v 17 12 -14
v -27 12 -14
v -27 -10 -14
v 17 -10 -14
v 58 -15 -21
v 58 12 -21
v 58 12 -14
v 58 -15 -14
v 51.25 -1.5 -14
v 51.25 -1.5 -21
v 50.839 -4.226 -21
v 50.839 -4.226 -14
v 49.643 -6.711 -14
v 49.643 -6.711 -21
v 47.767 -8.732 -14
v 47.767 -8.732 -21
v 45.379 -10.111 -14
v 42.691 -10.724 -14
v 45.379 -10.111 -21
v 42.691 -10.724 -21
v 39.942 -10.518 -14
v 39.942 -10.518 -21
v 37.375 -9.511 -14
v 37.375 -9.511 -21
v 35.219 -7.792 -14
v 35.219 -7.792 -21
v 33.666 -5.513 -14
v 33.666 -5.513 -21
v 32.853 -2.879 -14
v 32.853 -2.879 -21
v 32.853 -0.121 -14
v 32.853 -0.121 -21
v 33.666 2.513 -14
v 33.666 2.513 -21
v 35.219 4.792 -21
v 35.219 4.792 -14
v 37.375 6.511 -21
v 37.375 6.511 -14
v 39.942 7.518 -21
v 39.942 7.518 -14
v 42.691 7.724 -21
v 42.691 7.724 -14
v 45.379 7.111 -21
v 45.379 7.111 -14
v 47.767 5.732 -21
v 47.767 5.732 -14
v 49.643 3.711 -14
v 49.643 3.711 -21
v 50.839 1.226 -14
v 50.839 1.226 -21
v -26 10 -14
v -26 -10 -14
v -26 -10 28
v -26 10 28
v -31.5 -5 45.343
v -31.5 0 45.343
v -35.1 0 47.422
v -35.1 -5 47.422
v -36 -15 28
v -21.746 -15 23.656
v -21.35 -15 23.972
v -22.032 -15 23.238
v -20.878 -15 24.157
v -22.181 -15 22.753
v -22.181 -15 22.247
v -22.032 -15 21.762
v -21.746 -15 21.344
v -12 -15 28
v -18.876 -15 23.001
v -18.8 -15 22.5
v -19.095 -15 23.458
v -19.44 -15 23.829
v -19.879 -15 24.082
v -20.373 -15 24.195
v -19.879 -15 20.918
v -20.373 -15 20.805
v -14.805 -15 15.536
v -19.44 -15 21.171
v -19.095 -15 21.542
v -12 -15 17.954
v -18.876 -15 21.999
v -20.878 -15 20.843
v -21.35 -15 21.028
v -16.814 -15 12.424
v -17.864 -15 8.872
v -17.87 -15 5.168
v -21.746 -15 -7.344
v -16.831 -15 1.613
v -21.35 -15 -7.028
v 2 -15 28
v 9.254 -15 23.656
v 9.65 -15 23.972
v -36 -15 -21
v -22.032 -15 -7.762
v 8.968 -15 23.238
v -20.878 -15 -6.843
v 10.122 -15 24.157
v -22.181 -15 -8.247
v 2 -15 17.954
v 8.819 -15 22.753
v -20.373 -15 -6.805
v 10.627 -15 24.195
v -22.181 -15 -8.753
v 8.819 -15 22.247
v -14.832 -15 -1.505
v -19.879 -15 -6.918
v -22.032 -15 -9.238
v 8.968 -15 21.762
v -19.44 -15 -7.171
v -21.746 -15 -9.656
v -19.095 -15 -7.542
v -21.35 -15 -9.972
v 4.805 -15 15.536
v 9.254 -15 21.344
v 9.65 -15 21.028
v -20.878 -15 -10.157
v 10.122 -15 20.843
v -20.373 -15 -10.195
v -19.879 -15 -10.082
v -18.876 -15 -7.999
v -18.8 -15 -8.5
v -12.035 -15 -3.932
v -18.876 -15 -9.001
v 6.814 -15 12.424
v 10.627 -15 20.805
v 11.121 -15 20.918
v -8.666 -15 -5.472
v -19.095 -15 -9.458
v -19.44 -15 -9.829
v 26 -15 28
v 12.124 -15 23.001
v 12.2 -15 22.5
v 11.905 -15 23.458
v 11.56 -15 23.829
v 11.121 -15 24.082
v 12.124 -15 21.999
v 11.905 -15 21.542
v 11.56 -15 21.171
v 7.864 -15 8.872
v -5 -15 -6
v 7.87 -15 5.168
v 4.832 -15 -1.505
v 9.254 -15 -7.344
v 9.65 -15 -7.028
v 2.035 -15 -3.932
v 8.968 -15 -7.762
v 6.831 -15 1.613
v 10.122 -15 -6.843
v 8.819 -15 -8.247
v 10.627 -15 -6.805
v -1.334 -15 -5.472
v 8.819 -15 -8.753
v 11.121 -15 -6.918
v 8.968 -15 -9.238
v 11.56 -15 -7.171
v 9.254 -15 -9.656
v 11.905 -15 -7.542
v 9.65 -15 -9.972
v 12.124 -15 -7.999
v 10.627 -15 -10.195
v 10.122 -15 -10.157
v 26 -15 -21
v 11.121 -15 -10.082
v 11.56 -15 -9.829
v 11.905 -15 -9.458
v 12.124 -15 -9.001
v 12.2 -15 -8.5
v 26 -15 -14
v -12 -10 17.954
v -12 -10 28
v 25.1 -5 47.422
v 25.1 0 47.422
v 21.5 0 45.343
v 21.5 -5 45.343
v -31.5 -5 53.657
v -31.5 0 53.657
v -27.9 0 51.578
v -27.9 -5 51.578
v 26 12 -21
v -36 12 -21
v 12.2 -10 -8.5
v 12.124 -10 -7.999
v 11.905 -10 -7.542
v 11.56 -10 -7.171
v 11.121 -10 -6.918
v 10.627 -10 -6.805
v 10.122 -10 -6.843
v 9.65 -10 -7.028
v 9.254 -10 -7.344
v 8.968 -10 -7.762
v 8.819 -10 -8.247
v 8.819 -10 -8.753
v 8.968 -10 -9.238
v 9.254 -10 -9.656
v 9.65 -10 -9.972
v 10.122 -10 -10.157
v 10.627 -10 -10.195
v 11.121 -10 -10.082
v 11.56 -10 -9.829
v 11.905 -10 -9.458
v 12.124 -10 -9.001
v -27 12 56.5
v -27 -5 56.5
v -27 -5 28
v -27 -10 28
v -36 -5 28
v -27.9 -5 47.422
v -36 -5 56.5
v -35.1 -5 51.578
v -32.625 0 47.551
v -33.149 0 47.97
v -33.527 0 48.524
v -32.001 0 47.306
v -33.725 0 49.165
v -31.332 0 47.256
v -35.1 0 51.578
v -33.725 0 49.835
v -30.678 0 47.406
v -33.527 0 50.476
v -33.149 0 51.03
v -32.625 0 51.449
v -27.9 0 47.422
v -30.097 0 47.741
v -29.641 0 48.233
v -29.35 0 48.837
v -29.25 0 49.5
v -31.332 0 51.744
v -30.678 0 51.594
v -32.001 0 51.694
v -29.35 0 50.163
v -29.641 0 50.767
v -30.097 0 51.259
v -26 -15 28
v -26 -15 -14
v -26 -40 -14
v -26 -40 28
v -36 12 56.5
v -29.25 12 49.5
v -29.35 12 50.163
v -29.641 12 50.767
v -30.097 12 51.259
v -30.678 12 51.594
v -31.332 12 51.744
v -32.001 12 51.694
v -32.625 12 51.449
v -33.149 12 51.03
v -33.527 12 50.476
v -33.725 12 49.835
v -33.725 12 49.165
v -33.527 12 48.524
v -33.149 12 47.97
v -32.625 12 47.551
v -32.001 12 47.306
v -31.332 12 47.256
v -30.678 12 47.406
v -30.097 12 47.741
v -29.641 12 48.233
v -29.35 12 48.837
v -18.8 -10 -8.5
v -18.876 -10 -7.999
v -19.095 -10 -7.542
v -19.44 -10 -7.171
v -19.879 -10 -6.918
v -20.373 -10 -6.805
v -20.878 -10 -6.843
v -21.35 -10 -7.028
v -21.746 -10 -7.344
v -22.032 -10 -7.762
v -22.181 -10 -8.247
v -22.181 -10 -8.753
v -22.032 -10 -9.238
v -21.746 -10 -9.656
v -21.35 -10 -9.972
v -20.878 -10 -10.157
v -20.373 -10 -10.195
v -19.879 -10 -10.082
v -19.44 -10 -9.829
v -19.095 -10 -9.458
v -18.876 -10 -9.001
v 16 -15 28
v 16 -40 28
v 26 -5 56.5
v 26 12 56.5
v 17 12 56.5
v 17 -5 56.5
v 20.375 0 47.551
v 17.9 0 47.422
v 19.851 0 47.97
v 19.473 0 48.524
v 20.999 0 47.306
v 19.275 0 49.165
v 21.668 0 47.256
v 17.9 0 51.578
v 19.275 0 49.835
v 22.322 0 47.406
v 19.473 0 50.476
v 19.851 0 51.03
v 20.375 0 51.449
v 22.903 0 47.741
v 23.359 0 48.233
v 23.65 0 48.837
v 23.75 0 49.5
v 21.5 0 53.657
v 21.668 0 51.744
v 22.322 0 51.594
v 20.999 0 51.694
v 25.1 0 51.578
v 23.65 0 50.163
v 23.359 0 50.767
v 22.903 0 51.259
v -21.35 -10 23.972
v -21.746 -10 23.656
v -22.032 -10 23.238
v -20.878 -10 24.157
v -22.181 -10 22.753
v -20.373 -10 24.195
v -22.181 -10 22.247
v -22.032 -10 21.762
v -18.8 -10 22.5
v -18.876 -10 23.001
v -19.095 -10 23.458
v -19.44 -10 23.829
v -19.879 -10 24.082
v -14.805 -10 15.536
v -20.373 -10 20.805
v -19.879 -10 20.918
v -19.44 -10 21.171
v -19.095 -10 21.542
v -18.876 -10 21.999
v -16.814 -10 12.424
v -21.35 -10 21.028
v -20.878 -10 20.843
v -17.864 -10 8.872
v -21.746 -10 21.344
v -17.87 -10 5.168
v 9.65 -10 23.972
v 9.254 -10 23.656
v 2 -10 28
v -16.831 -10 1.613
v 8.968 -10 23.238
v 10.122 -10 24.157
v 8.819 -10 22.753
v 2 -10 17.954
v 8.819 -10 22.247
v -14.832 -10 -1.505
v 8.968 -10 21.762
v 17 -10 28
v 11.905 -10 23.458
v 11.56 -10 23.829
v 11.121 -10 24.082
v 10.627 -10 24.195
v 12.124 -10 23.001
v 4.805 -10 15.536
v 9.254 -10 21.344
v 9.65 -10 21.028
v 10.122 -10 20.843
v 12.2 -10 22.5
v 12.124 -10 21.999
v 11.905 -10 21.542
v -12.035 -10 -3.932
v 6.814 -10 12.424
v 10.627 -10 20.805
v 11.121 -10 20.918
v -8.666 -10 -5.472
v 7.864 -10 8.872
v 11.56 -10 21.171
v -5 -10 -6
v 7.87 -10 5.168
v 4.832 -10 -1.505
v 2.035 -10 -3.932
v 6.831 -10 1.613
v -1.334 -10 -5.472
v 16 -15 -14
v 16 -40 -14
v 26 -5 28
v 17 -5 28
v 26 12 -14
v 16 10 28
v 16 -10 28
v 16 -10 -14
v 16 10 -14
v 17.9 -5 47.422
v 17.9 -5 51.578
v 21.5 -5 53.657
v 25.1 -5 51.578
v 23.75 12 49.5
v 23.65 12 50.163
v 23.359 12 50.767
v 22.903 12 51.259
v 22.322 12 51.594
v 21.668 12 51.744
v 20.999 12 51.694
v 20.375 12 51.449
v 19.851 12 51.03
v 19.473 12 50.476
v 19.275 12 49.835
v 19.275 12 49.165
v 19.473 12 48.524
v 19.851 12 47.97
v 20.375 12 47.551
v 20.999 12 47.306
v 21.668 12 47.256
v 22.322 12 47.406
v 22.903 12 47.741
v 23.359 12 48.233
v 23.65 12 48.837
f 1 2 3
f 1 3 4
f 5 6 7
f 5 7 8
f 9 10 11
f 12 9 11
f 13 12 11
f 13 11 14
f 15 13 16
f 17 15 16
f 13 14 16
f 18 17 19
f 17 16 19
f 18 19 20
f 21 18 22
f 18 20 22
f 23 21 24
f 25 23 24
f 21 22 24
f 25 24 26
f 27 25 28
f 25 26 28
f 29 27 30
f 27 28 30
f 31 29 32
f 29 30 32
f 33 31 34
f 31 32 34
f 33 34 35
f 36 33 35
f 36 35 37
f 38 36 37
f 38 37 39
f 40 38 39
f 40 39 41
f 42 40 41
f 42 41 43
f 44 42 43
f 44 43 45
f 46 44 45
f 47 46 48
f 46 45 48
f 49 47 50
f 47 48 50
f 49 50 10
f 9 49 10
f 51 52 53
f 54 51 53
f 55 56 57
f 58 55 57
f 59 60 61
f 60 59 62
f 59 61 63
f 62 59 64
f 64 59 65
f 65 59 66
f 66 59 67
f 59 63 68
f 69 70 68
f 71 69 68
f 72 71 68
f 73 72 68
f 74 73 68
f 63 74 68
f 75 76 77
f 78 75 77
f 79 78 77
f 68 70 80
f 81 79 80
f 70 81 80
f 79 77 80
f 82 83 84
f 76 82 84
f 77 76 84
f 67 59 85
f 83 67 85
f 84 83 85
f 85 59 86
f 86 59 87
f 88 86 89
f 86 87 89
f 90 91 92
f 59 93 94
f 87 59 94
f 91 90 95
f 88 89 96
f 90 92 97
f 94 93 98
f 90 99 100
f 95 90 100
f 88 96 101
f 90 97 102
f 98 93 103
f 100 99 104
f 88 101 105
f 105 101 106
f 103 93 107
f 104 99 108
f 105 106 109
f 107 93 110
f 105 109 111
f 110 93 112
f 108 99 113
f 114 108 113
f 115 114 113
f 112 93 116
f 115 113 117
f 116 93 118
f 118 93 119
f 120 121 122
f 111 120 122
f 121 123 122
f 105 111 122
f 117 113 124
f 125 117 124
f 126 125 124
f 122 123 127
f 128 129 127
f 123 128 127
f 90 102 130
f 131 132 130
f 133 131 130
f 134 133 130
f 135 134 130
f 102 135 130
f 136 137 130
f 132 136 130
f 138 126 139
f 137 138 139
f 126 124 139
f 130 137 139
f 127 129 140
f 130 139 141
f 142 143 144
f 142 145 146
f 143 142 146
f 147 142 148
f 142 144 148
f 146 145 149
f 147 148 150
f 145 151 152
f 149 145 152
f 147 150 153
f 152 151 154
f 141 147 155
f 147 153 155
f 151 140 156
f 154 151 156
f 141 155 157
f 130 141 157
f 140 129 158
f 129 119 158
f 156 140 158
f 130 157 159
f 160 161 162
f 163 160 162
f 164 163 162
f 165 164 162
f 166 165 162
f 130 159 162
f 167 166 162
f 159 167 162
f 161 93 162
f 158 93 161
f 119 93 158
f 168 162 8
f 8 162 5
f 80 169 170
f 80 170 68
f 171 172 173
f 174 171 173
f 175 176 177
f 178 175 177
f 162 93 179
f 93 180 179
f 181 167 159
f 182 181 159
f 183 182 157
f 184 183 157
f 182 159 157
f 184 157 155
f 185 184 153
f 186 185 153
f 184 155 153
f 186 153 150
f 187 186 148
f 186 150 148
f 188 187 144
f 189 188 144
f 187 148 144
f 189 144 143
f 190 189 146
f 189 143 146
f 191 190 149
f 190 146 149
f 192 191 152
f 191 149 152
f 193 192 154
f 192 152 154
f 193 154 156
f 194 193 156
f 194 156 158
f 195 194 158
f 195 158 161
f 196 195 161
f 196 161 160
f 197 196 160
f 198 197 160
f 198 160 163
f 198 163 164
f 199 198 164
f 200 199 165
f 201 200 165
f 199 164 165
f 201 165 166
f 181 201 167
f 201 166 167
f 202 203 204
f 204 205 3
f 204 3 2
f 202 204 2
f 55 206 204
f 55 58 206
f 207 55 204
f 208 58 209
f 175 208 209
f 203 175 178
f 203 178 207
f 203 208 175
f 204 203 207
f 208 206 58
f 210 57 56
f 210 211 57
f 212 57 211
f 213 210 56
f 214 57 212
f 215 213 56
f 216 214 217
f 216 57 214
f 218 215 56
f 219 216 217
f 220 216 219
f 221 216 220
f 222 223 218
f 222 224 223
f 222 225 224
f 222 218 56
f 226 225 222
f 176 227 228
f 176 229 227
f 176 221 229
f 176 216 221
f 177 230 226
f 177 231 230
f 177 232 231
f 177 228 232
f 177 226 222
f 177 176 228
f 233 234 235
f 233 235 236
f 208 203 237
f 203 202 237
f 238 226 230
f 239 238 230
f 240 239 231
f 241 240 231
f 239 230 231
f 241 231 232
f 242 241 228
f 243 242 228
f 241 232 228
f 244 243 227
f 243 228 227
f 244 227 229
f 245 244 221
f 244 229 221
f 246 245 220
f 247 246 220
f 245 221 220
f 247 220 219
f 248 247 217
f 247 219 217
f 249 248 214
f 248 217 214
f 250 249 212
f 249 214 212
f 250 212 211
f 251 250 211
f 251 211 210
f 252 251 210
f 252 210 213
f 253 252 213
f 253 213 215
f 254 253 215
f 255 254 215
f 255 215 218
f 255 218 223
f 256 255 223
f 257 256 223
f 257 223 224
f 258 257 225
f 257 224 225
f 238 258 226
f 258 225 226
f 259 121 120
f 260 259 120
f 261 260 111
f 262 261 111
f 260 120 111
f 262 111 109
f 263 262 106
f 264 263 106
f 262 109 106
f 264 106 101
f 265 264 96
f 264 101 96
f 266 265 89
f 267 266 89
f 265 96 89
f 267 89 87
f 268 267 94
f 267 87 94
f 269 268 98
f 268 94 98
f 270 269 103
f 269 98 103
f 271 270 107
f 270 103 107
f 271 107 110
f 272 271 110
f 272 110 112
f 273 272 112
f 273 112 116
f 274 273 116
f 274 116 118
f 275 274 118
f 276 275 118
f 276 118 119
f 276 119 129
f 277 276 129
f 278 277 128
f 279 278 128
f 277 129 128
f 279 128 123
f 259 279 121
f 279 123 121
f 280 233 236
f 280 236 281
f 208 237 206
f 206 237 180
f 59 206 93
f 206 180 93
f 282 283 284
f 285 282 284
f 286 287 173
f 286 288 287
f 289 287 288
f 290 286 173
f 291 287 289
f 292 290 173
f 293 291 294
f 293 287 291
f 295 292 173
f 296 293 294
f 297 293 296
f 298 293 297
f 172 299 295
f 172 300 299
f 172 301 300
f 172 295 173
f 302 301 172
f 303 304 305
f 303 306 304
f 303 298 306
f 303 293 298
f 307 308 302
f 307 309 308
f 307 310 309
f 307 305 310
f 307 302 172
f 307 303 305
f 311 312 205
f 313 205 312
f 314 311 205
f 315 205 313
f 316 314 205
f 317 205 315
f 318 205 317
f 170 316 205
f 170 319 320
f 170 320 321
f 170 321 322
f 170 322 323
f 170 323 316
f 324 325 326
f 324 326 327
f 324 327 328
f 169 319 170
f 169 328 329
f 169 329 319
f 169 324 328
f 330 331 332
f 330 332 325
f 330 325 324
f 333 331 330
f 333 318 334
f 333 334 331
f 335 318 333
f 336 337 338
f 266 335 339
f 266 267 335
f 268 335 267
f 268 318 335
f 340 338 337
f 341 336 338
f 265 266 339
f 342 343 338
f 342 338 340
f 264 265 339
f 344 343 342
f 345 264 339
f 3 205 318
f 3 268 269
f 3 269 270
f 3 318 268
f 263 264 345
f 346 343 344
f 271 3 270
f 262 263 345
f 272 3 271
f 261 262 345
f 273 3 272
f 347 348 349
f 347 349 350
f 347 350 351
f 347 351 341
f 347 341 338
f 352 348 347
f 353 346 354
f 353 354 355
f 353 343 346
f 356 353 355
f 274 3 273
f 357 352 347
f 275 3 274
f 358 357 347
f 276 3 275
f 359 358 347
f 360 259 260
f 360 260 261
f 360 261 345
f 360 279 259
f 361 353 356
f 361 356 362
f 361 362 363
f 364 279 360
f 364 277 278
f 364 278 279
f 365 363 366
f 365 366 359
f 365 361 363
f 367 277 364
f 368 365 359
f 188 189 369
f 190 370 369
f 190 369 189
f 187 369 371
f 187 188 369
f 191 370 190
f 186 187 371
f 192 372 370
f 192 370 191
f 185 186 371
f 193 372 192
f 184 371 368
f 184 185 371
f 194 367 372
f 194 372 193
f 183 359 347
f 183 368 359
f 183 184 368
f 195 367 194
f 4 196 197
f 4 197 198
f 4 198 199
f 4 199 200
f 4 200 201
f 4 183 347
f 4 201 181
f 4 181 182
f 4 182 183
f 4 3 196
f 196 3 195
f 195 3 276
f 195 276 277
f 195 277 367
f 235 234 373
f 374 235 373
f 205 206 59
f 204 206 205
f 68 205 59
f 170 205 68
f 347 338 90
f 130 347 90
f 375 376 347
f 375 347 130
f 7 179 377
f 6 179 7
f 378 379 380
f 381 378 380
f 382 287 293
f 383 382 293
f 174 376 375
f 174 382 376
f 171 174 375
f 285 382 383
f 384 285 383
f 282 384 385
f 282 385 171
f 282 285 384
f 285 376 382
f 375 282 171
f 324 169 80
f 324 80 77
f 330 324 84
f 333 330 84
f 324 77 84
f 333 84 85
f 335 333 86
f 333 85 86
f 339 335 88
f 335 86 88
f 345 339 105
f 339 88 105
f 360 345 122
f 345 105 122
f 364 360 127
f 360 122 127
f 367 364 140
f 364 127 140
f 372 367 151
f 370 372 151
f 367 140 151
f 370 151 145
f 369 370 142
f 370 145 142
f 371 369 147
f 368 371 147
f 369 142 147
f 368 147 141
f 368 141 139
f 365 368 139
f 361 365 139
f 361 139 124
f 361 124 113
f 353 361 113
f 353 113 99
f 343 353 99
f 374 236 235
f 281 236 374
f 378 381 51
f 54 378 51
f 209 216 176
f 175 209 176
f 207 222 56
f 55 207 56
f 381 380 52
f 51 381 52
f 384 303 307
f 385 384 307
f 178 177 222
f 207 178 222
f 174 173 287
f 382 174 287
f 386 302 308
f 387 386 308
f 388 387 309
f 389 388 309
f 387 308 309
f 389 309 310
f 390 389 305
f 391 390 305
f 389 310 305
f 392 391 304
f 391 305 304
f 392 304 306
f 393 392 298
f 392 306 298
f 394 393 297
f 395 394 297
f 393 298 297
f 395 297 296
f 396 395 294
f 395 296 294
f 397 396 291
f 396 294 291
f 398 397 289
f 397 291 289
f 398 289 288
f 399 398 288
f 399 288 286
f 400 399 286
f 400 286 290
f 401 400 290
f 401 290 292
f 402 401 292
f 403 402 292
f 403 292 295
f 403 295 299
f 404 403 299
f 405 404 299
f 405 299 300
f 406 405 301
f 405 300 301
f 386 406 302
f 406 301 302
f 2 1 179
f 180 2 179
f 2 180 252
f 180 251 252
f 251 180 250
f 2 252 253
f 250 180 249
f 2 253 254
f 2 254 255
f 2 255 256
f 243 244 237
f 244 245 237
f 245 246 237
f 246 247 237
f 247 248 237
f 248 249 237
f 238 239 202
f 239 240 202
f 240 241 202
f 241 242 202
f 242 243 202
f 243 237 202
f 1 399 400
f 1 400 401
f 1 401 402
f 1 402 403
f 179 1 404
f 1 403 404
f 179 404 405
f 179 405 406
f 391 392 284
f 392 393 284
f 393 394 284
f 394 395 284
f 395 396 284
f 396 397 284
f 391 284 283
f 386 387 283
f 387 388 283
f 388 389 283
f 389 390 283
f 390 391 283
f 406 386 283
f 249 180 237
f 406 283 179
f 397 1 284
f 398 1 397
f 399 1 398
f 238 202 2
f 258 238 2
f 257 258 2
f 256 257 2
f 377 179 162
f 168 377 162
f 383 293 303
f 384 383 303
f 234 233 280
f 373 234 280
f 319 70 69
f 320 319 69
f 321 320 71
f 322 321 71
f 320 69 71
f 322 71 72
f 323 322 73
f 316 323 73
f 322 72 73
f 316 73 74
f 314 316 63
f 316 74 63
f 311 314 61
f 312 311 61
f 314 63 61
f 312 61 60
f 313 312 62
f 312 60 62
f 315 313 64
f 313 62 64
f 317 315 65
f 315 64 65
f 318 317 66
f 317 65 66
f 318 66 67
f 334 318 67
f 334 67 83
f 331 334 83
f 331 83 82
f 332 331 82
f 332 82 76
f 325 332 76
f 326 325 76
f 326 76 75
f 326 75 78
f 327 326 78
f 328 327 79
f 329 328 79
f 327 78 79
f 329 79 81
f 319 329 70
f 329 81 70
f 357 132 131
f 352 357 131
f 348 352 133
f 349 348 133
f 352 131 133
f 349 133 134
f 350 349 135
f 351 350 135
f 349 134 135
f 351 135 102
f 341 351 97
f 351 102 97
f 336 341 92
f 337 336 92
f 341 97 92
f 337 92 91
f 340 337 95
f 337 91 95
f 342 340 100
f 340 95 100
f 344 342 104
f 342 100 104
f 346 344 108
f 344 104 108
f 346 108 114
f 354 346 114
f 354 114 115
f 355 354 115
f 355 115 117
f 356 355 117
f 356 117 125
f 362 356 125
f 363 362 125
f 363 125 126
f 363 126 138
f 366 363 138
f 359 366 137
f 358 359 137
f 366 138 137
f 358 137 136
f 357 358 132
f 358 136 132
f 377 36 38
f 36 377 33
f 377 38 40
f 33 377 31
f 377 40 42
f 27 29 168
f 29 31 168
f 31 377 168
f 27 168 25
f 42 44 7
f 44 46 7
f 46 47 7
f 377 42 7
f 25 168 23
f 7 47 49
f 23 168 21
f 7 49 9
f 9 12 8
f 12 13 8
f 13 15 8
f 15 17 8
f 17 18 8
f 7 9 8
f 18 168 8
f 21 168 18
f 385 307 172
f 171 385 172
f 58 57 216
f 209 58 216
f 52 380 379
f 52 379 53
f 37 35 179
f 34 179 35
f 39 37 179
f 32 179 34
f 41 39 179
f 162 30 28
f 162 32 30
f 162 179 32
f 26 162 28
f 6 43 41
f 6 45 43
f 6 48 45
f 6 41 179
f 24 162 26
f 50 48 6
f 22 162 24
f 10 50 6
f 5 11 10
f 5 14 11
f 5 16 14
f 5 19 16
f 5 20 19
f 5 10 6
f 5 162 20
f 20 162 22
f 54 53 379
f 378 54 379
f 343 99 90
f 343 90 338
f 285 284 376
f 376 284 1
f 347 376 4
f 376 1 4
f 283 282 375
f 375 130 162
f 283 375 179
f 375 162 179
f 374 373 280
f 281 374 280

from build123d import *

# Parameters (mm, degrees)
F1_R      = 2.25
F2_DEPTH  = 12
F4_DEPTH  = 5
F5_W      = 44
F5_H      = 5
F6_DEPTH  = 7
F7_DEPTH  = 42
F8_R      = 1.7
F8_R_2    = 13
F9_DEPTH  = 5
F11_REACH = 63.8670687473
F12_R     = 1.7
F13_DEPTH = 20
F14_W     = 42
F14_H     = 42
F14_R     = 1.7
F14_R_2   = 13
F15_DEPTH = 25
F16_W     = 32
F16_H     = 27
F16_R     = 9.25
F17_DEPTH = 7


with BuildPart() as f2:
    # F1 (on Front) → F2 (new body)
    with BuildSketch(Plane.XZ):
        Polygon((-27, 56.5), (-36, 56.5), (-36, -21), (26, -21), (26, 56.5), (17, 56.5), (17, -14), (-27, -14), align=None)
        with Locations((-31.5, 49.5)):
            Circle(F1_R, mode=Mode.SUBTRACT)
        with Locations((21.5, 49.5)):
            Circle(F1_R, mode=Mode.SUBTRACT)
    extrude(amount=-F2_DEPTH)

    # F3 (on face) → F4 (join)
    with BuildSketch(Plane.XZ):
        Polygon((-27, -14), (-27, 56.5), (-36, 56.5), (-36, -21), (26, -21), (26, 56.5), (17, 56.5), (17, -14), align=None)
        Polygon((-31.5, 53.6569219382), (-27.9, 51.5784609691), (-27.9, 47.4215390309), (-31.5, 45.3430780618), (-35.1, 47.4215390309), (-35.1, 51.5784609691), align=None, mode=Mode.SUBTRACT)
        Polygon((21.5, 53.6569219382), (25.1, 51.5784609691), (25.1, 47.4215390309), (21.5, 45.3430780618), (17.9, 47.4215390309), (17.9, 51.5784609691), align=None, mode=Mode.SUBTRACT)
    extrude(amount=F4_DEPTH)

    # F5 (on face) → F6 (join, through all)
    with BuildSketch(Plane.XY.offset(-14)):
        with Locations((-5, -7.5)):
            Rectangle(F5_W, F5_H)
        with Locations((-5, -12.5)):
            Rectangle(F5_W, F5_H)
        Polygon((-27, -10), (-27, -5), (-36, -5), (-36, -15), (-27, -15), align=None)
        Polygon((26, -5), (17, -5), (17, -10), (17, -15), (26, -15), align=None)
    extrude(amount=-F6_DEPTH)

    # F5 (on face) → F7 (join)
    with BuildSketch(Plane.XY.offset(-14)):
        with Locations((-5, -12.5)):
            Rectangle(F5_W, F5_H)
        Polygon((-27, -10), (-27, -5), (-36, -5), (-36, -15), (-27, -15), align=None)
        Polygon((26, -5), (17, -5), (17, -10), (17, -15), (26, -15), align=None)
    extrude(amount=F7_DEPTH)

    # F8 (on face) → F9 (cut, through all)
    with BuildSketch(Plane.XZ.offset(15)):
        with Locations((-20.5, 22.5)):
            Circle(F8_R)
        with Locations((-5, 7)):
            Circle(F8_R_2)
        with Locations((-20.5, -8.5)):
            Circle(F8_R)
        with Locations((10.5, -8.5)):
            Circle(F8_R)
        with Locations((10.5, 22.5)):
            Circle(F8_R)
    extrude(amount=-F9_DEPTH, mode=Mode.SUBTRACT)

    f11_end = f2.faces().sort_by_distance((-18, -12.5, 7))[0]
    # F10 (on face) → F11 (cut, up to a face of the model that its end follows)
    with BuildSketch(Plane.XY.offset(28)):
        Polygon((2, -10), (-5, -10), (-12, -10), (-12, -15), (2, -15), align=None)
    f11_long = extrude(amount=-F11_REACH, mode=Mode.PRIVATE)
    add(split(f11_long, bisect_by=f11_end, keep=Keep.ALL, mode=Mode.PRIVATE).solids().sort_by_distance((-5, -12.5, 28))[0], mode=Mode.SUBTRACT)


with BuildPart() as f13:
    # F12 (on face) → F13 (new body)
    with BuildSketch(Plane(origin=(0, -10, 0), x_dir=(-1, 0, 0), z_dir=(0, 1, 0))):
        with BuildLine():
            Line((-16, -14), (26, -14))
            Line((26, -14), (26, 28))
            Line((26, 28), (12, 28))
            Line((12, 28), (12, 17.9544511501))
            ThreePointArc((12, 17.9544511501), (5, -6), (-2, 17.9544511501))
            Line((-2, 17.9544511501), (-2, 28))
            Line((-2, 28), (-16, 28))
            Line((-16, 28), (-16, -14))
        make_face()
        with Locations((-10.5, -8.5)):
            Circle(F12_R, mode=Mode.SUBTRACT)
        with Locations((20.5, -8.5)):
            Circle(F12_R, mode=Mode.SUBTRACT)
        with Locations((-10.5, 22.5)):
            Circle(F12_R, mode=Mode.SUBTRACT)
        with Locations((20.5, 22.5)):
            Circle(F12_R, mode=Mode.SUBTRACT)
        with BuildLine():
            Line((12, 17.9544511501), (12, 28))
            Line((12, 28), (-2, 28))
            Line((-2, 28), (-2, 17.9544511501))
            ThreePointArc((-2, 17.9544511501), (5, -6), (12, 17.9544511501))
        make_face()
        with Locations((-10.5, 22.5)):
            Circle(F12_R)
        with Locations((20.5, 22.5)):
            Circle(F12_R)
        with Locations((-10.5, -8.5)):
            Circle(F12_R)
        with Locations((20.5, -8.5)):
            Circle(F12_R)
    extrude(amount=F13_DEPTH)


with BuildPart() as f15:
    # F14 (on face) → F15 (new body)
    with BuildSketch(Plane.XZ.offset(15)):
        with Locations((-5, 7)):
            Rectangle(F14_W, F14_H)
        with Locations((-20.5, -8.5)):
            Circle(F14_R, mode=Mode.SUBTRACT)
        with Locations((10.5, -8.5)):
            Circle(F14_R, mode=Mode.SUBTRACT)
        with Locations((-20.5, 22.5)):
            Circle(F14_R, mode=Mode.SUBTRACT)
        with Locations((-5, 7)):
            Circle(F14_R_2, mode=Mode.SUBTRACT)
        with Locations((10.5, 22.5)):
            Circle(F14_R, mode=Mode.SUBTRACT)
    extrude(amount=F15_DEPTH)

    # F8 (on face) → F15, piece 2 (join)
    with BuildSketch(Plane.XZ.offset(15)):
        with Locations((-20.5, 22.5)):
            Circle(F8_R)
    extrude(amount=F15_DEPTH)

    # F8 (on face) → F15, piece 3 (join)
    with BuildSketch(Plane.XZ.offset(15)):
        with Locations((-5, 7)):
            Circle(F8_R_2)
    extrude(amount=F15_DEPTH)

    # F8 (on face) → F15, piece 4 (join)
    with BuildSketch(Plane.XZ.offset(15)):
        with Locations((-20.5, -8.5)):
            Circle(F8_R)
    extrude(amount=F15_DEPTH)

    # F8 (on face) → F15, piece 5 (join)
    with BuildSketch(Plane.XZ.offset(15)):
        with Locations((10.5, 22.5)):
            Circle(F8_R)
    extrude(amount=F15_DEPTH)

    # F8 (on face) → F15, piece 6 (join)
    with BuildSketch(Plane.XZ.offset(15)):
        with Locations((10.5, -8.5)):
            Circle(F8_R)
    extrude(amount=F15_DEPTH)


with BuildPart() as f17:
    # F16 (on face) → F17 (new body, through all)
    with BuildSketch(Plane(origin=(0, 0, -21), x_dir=(1, 0, 0), z_dir=(0, 0, -1))):
        with Locations((42, 1.5)):
            Rectangle(F16_W, F16_H)
        with Locations((42, 1.5)):
            Circle(F16_R, mode=Mode.SUBTRACT)
    extrude(amount=-F17_DEPTH)


solid = Compound([f2.part, f13.part, f15.part, f17.part])
